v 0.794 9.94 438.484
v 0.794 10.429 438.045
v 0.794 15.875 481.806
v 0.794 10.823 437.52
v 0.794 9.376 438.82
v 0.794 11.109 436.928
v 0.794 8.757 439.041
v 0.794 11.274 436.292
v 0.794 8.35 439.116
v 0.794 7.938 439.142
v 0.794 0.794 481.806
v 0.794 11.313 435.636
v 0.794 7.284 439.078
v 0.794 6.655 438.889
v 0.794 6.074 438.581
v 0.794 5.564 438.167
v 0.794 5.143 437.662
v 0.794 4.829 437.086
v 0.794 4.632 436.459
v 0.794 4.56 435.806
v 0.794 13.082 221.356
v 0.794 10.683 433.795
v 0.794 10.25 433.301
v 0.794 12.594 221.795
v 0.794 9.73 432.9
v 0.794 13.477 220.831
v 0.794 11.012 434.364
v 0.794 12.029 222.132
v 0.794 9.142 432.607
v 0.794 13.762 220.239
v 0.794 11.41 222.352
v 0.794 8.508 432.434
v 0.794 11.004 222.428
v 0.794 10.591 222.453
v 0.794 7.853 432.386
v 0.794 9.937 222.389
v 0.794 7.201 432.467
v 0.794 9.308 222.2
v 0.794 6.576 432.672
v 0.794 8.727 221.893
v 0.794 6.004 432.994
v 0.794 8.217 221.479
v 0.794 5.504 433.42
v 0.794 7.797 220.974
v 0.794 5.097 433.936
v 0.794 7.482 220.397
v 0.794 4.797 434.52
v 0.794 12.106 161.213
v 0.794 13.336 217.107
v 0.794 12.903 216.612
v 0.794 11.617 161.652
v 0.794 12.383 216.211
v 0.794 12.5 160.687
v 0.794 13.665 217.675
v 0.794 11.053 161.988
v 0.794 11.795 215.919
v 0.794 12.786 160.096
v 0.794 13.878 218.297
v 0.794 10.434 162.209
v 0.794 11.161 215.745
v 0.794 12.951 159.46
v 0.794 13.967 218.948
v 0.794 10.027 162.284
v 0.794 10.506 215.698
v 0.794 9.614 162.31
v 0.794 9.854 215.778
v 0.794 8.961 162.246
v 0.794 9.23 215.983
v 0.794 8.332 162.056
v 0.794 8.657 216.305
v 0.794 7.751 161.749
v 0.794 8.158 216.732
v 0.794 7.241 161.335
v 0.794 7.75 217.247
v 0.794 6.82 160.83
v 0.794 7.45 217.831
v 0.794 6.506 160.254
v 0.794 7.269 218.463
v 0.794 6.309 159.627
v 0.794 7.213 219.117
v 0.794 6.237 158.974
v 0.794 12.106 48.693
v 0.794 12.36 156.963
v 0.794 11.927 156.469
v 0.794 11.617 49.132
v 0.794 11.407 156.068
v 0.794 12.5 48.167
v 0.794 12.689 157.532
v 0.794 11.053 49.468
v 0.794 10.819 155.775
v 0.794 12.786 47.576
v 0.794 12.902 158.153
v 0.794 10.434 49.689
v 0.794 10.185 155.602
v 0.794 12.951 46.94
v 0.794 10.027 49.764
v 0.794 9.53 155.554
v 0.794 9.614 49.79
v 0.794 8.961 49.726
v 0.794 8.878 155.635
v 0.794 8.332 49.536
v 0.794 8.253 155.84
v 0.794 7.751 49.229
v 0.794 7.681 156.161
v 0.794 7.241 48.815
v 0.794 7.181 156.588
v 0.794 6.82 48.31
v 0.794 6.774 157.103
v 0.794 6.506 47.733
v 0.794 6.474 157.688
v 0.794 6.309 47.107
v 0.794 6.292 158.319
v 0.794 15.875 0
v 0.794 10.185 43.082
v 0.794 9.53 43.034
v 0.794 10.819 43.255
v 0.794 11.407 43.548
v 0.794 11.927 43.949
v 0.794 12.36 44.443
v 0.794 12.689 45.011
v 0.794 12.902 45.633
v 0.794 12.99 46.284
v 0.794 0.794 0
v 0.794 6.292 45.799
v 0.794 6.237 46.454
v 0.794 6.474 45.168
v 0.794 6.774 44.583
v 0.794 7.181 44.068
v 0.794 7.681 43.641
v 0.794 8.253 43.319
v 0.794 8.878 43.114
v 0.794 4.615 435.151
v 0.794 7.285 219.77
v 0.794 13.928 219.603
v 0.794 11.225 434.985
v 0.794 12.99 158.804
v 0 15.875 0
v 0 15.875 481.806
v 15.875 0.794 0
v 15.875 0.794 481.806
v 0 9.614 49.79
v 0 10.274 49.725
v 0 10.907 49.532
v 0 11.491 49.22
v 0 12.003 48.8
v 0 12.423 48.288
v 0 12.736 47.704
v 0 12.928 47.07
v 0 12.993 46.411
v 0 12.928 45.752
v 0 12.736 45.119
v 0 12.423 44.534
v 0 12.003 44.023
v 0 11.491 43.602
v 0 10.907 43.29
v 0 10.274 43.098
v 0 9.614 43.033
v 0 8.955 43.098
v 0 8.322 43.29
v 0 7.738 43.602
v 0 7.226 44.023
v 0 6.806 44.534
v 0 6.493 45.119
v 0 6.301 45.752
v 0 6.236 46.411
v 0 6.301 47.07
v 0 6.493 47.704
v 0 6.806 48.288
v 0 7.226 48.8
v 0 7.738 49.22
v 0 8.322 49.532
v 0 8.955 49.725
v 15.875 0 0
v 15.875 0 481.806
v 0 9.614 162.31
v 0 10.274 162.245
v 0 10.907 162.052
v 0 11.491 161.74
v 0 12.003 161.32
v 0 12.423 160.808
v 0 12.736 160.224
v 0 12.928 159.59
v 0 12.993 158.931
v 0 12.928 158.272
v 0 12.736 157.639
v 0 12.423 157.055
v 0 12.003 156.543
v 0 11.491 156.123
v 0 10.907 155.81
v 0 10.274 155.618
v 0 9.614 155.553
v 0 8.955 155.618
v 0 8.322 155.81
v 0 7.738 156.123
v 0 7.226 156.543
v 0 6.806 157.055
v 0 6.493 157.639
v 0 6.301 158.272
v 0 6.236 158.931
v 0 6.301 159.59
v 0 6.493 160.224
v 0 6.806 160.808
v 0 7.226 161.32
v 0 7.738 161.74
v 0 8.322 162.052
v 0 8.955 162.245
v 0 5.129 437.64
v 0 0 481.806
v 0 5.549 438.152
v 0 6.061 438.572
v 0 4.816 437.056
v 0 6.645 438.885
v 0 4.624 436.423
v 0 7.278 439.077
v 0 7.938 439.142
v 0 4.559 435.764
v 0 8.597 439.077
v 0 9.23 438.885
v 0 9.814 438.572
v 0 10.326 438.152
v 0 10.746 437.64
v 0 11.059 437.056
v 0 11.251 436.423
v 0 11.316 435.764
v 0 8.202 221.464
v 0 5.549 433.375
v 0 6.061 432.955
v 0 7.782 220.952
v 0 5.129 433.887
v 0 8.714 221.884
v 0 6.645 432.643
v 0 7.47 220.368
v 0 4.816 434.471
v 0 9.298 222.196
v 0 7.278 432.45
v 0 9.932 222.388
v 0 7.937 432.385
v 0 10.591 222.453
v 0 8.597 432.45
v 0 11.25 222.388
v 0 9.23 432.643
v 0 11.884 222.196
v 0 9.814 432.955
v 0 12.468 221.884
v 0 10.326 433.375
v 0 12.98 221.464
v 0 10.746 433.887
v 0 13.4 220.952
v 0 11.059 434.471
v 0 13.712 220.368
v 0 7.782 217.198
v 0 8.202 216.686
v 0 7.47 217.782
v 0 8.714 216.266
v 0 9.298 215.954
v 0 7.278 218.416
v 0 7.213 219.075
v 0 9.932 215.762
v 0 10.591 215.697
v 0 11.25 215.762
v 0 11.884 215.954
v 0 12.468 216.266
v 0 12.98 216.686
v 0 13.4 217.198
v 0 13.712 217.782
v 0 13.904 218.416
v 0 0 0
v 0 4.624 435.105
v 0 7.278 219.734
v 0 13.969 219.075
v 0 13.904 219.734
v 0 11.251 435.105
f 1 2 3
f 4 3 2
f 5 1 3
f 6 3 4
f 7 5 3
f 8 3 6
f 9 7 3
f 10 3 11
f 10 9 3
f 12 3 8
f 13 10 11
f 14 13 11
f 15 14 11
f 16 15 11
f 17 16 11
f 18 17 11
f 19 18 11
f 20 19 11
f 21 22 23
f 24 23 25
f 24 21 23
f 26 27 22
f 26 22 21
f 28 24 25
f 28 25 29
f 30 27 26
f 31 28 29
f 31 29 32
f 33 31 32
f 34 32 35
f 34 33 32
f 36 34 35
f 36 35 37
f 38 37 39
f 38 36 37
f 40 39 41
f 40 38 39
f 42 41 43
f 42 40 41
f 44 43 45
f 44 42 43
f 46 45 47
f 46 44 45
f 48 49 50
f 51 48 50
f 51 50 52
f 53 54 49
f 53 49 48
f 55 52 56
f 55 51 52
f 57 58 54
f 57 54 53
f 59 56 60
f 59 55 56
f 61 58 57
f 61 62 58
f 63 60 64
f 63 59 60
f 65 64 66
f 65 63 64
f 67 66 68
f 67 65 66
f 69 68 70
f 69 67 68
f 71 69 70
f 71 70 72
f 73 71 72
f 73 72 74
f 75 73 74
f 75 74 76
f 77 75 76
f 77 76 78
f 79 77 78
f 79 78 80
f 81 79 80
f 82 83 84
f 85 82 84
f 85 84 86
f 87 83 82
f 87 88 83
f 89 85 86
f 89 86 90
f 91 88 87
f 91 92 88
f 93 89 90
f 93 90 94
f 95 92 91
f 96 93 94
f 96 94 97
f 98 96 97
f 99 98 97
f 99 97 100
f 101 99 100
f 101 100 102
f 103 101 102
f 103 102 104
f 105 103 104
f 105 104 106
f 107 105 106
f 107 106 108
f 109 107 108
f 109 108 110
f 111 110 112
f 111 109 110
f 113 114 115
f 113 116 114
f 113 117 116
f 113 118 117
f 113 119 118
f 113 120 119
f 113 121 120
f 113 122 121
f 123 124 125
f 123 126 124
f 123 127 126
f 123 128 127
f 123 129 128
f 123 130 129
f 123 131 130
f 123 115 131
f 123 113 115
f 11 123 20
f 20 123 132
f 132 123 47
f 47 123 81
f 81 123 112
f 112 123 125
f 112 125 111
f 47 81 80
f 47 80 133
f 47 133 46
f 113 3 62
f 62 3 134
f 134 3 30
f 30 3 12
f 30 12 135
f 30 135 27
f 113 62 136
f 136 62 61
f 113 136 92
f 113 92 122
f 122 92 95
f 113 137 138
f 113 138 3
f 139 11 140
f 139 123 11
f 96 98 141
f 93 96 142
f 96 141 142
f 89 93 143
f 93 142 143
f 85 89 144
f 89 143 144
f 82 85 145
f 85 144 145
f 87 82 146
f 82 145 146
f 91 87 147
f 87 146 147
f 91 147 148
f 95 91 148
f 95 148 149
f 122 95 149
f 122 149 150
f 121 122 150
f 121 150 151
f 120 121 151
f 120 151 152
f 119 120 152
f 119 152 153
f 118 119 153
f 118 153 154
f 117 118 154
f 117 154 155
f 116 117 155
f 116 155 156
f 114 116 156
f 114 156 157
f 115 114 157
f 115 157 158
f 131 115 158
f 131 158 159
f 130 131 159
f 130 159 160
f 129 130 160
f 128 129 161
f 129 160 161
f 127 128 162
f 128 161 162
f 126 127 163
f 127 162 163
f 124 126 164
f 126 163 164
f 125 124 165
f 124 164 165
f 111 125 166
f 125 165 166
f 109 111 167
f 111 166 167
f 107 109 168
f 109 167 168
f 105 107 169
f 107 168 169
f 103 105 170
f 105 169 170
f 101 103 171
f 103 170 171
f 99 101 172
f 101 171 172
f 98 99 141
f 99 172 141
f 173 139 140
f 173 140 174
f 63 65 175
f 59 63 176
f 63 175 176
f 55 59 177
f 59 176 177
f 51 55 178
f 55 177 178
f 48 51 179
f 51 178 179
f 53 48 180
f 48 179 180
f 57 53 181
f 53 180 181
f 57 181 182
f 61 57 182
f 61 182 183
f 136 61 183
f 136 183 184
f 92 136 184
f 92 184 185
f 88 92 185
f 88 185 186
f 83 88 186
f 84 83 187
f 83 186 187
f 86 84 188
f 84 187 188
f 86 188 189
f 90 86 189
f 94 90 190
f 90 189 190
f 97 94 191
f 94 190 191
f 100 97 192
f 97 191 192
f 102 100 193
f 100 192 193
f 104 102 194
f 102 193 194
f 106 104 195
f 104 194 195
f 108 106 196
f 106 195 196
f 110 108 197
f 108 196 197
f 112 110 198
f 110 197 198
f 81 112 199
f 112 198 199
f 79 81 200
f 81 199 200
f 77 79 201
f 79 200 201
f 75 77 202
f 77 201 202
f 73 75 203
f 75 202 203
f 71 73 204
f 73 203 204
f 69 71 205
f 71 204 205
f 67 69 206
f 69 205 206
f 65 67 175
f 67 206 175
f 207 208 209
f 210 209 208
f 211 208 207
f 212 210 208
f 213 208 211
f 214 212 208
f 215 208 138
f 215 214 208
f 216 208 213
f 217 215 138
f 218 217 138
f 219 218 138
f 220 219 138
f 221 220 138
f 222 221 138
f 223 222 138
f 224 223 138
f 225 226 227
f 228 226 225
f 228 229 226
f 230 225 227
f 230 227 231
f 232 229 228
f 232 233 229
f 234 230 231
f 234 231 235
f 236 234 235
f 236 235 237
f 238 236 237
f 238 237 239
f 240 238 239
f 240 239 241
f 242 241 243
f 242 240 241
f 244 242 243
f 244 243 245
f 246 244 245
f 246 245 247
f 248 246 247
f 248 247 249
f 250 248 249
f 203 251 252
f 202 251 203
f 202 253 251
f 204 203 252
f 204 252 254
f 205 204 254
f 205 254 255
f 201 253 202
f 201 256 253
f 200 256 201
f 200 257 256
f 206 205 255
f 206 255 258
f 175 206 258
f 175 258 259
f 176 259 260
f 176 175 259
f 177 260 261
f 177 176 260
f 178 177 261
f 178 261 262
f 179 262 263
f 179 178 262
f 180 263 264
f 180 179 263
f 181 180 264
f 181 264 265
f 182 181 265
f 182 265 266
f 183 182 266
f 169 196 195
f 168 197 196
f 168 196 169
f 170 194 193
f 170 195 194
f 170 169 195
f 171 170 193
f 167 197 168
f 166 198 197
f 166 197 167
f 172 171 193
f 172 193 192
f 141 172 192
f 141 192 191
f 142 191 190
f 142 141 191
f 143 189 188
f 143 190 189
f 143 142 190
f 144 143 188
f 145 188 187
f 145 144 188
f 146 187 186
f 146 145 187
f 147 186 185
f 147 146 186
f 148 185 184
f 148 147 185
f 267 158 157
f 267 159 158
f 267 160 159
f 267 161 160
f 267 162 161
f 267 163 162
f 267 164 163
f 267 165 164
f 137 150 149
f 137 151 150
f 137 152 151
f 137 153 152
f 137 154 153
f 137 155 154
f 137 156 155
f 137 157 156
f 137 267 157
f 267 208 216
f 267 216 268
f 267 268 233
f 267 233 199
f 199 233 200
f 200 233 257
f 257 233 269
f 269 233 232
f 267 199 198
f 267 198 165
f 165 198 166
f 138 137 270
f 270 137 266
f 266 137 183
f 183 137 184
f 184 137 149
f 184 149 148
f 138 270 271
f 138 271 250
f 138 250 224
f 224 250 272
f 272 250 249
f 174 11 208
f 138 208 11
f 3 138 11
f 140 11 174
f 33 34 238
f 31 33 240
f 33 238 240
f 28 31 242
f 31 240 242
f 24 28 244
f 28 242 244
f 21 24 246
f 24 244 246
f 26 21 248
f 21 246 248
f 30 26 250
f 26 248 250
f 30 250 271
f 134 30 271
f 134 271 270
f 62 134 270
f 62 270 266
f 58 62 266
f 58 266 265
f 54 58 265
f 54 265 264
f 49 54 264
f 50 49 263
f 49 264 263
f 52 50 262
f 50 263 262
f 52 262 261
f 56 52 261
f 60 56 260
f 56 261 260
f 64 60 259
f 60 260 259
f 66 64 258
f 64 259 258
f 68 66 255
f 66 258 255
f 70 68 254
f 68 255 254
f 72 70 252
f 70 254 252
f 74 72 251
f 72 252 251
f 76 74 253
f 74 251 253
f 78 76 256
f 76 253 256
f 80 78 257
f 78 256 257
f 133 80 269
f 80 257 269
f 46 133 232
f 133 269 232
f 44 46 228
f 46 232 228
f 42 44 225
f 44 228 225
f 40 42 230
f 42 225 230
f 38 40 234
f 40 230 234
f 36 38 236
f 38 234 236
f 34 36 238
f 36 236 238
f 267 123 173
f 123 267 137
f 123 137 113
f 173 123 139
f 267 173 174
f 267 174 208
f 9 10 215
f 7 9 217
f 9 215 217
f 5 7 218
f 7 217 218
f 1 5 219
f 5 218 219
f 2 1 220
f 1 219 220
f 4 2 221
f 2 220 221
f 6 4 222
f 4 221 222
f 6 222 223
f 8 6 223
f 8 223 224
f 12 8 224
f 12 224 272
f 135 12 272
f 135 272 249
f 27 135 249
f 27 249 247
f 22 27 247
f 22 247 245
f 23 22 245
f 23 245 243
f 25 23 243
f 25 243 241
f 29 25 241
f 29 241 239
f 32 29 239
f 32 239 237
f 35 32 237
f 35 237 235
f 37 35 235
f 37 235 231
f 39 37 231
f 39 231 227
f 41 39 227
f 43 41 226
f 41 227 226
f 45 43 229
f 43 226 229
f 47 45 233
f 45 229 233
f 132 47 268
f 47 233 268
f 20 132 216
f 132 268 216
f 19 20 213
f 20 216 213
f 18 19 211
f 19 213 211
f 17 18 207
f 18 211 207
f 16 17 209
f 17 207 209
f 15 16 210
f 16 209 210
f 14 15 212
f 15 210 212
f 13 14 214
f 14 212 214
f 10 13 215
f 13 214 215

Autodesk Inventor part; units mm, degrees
ref_plane "YZ Plane" through (0, 0, 0) normal (1, 0, 0) x (0, 1, 0)
ref_plane "XZ Plane" through (0, 0, 0) normal (0, 1, 0) x (-1, 0, 0)
ref_plane "XY Plane" through (0, 0, 0) normal (0, 0, 1) x (1, 0, 0)
sketch "Sketch1" plane through (0, 0, 0) normal (0, 0, 1) x (1, 0, 0)
  line L0 (0, 0) -> (0, 15.875)
  line L1 (0, 15.875) -> (0.7937, 15.875)
  line L2 (0.7937, 15.875) -> (0.7938, 0.7937)
  line L3 (0.7938, 0.7937) -> (15.875, 0.7937)
  line L4 (15.875, 0.7937) -> (15.875, 0)
  line L5 (15.875, 0) -> (0, 0)
  dimension "d0" = 15.875
  dimension "d1" = 0.7937
extrude "Extrusion1" add sketch "Sketch1" along normal blind 481.8063
sketch "Sketch2" plane through (0, 0, 0) normal (-1, 0, 0) x (0, 0, 1)
  circle A0 centre (46.4113, 9.6145) radius 3.3782 projected
  circle A1 centre (158.9314, 9.6145) radius 3.3782 projected
  circle A2 centre (701.675, 21.658) radius 3.3782 construction
  circle A3 centre (701.675, 43.7923) radius 3.3782 construction
  circle A4 centre (701.675, 32.7252) radius 3.3782 construction
  circle A5 centre (701.675, 10.5909) radius 3.3782 projected
  line L0 (366.395, 51.5938) -> (366.395, 0.7938) construction
  line L1 (708.025, 0.7938) -> (366.395, 0.7938) construction
  line L2 (708.025, 51.5938) -> (708.025, 0.7938) construction
  line L3 (366.395, 51.5938) -> (708.025, 51.5938) construction
  circle A6 centre (219.075, 21.658) radius 3.3782 construction
  circle A7 centre (219.075, 43.7923) radius 3.3782 construction
  circle A8 centre (219.075, 32.7252) radius 3.3782 construction
  circle A9 centre (219.075, 10.5909) radius 3.3782 projected
  line L4 (262.255, 51.5938) -> (262.255, 0.7938) construction
  line L5 (212.725, 0.7938) -> (262.255, 0.7938) construction
  line L6 (212.725, 0.7938) -> (212.725, 51.5938) construction
  line L7 (212.725, 51.5938) -> (262.255, 51.5938) construction
  line L8 (0, 0) -> (0, 15.875) projected
  line L9 (481.8063, 15.875) -> (481.8063, 0) projected
  line L10 (19.05, -173.8312) -> (19.05, -103.9812) construction
  line L11 (19.05, -103.9812) -> (285.75, -103.9812) construction
  line L12 (285.75, -103.9812) -> (285.75, -173.8312) construction
  line L13 (285.75, -173.8312) -> (19.05, -173.8312) construction
  line L14 (38.1, -294.4812) -> (38.1, -265.9062) construction
  line L15 (38.1, -265.9062) -> (285.75, -265.9062) construction
  line L16 (285.75, -265.9062) -> (285.75, -294.4812) construction
  line L17 (285.75, -294.4812) -> (38.1, -294.4812) construction
  circle A10 centre (593.725, 76.9938) radius 3.3782 construction
  circle A11 centre (314.325, -202.4062) radius 3.3782 construction
  circle A12 centre (454.025, 76.9938) radius 3.3782 construction
  circle A13 centre (417.4958, -17.1968) radius 3.3782 construction
  circle A14 centre (408.5156, -26.1771) radius 3.3782 construction
  circle A15 centre (516.3297, -116.0307) radius 3.3782 construction
  circle A16 centre (507.3495, -125.011) radius 3.3782 construction
  circle A17 centre (259.0504, -62.7062) radius 3.3782 construction
  circle A18 centre (314.325, -62.7062) radius 3.3782 construction
  line L18 (191.2043, 15.9645) -> (11.4863, 15.9645) construction
  line L19 (11.4863, 15.9645) -> (11.4863, 0.7938) construction
  line L20 (11.4863, 0.7938) -> (0, 0.7938) construction
  line L21 (0, 0.7938) -> (0, -316.7062) construction
  line L22 (0, -316.7062) -> (307.975, -316.7062) construction
  line L23 (307.975, -316.7062) -> (307.975, -208.7562) construction
  line L24 (307.975, -208.7562) -> (314.325, -208.7562) construction
  arc A19 (314.325, -208.7562) -> (600.075, 76.9938) centre (314.325, 76.9938) ccw construction
  line L25 (600.075, 76.9938) -> (600.075, 83.3438) construction
  line L26 (600.075, 83.3438) -> (587.375, 83.3438) construction
  line L27 (587.375, 83.3438) -> (587.375, 76.9938) construction
  arc A20 (314.325, -196.0562) -> (587.375, 76.9938) centre (314.325, 76.9938) ccw construction
  line L28 (314.325, -196.0562) -> (314.325, -69.0562) construction
  arc A21 (314.325, -69.0562) -> (460.375, 76.9938) centre (314.325, 76.9938) ccw construction
  line L29 (460.375, 76.9938) -> (460.375, 83.3438) construction
  line L30 (460.375, 83.3438) -> (447.675, 83.3438) construction
  line L31 (447.675, 83.3438) -> (447.675, 76.9938) construction
  arc A22 (314.325, -56.3562) -> (447.675, 76.9938) centre (314.325, 76.9938) ccw construction
  line L32 (314.325, -56.3562) -> (193.675, 0.7938) construction
  line L33 (193.675, 0.7938) -> (193.675, 13.4938) construction
  line L34 (193.675, 13.4938) -> (191.2043, 15.9645) construction
  line L35 (19.05, -215.1062) -> (19.05, -186.5312) construction
  line L36 (19.05, -186.5312) -> (285.75, -186.5312) construction
  line L37 (285.75, -186.5312) -> (285.75, -215.1062) construction
  line L38 (285.75, -215.1062) -> (19.05, -215.1062) construction
  line L39 (25.4, -253.2062) -> (25.4, -281.7812) construction
  line L40 (25.4, -281.7812) -> (19.05, -281.7812) construction
  line L41 (19.05, -281.7812) -> (19.05, -253.2062) construction
  line L42 (19.05, -253.2062) -> (12.7, -253.2062) construction
  line L43 (12.7, -253.2062) -> (12.7, -227.8062) construction
  line L44 (12.7, -227.8062) -> (215.9, -227.8062) construction
  line L45 (215.9, -227.8062) -> (215.9, -253.2062) construction
  line L46 (215.9, -253.2062) -> (25.4, -253.2062) construction
  line L47 (25.4, 6.4395) -> (25.4, -62.7062) construction
  line L48 (25.4, -62.7062) -> (215.9, -62.7062) construction
  line L49 (215.9, -62.7062) -> (215.9, -88.1062) construction
  line L50 (215.9, -88.1062) -> (12.7, -88.1062) construction
  line L51 (12.7, -88.1062) -> (12.7, -62.7062) construction
  line L52 (12.7, -62.7062) -> (19.05, -62.7062) construction
  line L53 (19.05, -62.7062) -> (19.05, 6.4395) construction
  line L54 (19.05, 6.4395) -> (25.4, 6.4395) construction
  circle A23 centre (238.125, -310.3562) radius 3.3782 construction
  circle A24 centre (219.075, -310.3562) radius 3.3782 construction
  circle A25 centre (46.4113, 9.6145) radius 3.3782 construction
  circle A26 centre (158.9314, 9.6145) radius 3.3782 construction
  arc A27 (314.325, -62.7062) -> (454.025, 76.9938) centre (314.325, 76.9938) ccw construction
  line L55 (481.8063, 7.9375) -> (0, 7.9375) construction
  circle A28 centre (435.7636, 7.9375) radius 3.3782
  dimension "d6" = 6.7564
extrude "Extrusion2" cut sketch "Sketch2" against normal through all
properties part number "Shooter Middle Support Bar" material "Aluminum 6061"
